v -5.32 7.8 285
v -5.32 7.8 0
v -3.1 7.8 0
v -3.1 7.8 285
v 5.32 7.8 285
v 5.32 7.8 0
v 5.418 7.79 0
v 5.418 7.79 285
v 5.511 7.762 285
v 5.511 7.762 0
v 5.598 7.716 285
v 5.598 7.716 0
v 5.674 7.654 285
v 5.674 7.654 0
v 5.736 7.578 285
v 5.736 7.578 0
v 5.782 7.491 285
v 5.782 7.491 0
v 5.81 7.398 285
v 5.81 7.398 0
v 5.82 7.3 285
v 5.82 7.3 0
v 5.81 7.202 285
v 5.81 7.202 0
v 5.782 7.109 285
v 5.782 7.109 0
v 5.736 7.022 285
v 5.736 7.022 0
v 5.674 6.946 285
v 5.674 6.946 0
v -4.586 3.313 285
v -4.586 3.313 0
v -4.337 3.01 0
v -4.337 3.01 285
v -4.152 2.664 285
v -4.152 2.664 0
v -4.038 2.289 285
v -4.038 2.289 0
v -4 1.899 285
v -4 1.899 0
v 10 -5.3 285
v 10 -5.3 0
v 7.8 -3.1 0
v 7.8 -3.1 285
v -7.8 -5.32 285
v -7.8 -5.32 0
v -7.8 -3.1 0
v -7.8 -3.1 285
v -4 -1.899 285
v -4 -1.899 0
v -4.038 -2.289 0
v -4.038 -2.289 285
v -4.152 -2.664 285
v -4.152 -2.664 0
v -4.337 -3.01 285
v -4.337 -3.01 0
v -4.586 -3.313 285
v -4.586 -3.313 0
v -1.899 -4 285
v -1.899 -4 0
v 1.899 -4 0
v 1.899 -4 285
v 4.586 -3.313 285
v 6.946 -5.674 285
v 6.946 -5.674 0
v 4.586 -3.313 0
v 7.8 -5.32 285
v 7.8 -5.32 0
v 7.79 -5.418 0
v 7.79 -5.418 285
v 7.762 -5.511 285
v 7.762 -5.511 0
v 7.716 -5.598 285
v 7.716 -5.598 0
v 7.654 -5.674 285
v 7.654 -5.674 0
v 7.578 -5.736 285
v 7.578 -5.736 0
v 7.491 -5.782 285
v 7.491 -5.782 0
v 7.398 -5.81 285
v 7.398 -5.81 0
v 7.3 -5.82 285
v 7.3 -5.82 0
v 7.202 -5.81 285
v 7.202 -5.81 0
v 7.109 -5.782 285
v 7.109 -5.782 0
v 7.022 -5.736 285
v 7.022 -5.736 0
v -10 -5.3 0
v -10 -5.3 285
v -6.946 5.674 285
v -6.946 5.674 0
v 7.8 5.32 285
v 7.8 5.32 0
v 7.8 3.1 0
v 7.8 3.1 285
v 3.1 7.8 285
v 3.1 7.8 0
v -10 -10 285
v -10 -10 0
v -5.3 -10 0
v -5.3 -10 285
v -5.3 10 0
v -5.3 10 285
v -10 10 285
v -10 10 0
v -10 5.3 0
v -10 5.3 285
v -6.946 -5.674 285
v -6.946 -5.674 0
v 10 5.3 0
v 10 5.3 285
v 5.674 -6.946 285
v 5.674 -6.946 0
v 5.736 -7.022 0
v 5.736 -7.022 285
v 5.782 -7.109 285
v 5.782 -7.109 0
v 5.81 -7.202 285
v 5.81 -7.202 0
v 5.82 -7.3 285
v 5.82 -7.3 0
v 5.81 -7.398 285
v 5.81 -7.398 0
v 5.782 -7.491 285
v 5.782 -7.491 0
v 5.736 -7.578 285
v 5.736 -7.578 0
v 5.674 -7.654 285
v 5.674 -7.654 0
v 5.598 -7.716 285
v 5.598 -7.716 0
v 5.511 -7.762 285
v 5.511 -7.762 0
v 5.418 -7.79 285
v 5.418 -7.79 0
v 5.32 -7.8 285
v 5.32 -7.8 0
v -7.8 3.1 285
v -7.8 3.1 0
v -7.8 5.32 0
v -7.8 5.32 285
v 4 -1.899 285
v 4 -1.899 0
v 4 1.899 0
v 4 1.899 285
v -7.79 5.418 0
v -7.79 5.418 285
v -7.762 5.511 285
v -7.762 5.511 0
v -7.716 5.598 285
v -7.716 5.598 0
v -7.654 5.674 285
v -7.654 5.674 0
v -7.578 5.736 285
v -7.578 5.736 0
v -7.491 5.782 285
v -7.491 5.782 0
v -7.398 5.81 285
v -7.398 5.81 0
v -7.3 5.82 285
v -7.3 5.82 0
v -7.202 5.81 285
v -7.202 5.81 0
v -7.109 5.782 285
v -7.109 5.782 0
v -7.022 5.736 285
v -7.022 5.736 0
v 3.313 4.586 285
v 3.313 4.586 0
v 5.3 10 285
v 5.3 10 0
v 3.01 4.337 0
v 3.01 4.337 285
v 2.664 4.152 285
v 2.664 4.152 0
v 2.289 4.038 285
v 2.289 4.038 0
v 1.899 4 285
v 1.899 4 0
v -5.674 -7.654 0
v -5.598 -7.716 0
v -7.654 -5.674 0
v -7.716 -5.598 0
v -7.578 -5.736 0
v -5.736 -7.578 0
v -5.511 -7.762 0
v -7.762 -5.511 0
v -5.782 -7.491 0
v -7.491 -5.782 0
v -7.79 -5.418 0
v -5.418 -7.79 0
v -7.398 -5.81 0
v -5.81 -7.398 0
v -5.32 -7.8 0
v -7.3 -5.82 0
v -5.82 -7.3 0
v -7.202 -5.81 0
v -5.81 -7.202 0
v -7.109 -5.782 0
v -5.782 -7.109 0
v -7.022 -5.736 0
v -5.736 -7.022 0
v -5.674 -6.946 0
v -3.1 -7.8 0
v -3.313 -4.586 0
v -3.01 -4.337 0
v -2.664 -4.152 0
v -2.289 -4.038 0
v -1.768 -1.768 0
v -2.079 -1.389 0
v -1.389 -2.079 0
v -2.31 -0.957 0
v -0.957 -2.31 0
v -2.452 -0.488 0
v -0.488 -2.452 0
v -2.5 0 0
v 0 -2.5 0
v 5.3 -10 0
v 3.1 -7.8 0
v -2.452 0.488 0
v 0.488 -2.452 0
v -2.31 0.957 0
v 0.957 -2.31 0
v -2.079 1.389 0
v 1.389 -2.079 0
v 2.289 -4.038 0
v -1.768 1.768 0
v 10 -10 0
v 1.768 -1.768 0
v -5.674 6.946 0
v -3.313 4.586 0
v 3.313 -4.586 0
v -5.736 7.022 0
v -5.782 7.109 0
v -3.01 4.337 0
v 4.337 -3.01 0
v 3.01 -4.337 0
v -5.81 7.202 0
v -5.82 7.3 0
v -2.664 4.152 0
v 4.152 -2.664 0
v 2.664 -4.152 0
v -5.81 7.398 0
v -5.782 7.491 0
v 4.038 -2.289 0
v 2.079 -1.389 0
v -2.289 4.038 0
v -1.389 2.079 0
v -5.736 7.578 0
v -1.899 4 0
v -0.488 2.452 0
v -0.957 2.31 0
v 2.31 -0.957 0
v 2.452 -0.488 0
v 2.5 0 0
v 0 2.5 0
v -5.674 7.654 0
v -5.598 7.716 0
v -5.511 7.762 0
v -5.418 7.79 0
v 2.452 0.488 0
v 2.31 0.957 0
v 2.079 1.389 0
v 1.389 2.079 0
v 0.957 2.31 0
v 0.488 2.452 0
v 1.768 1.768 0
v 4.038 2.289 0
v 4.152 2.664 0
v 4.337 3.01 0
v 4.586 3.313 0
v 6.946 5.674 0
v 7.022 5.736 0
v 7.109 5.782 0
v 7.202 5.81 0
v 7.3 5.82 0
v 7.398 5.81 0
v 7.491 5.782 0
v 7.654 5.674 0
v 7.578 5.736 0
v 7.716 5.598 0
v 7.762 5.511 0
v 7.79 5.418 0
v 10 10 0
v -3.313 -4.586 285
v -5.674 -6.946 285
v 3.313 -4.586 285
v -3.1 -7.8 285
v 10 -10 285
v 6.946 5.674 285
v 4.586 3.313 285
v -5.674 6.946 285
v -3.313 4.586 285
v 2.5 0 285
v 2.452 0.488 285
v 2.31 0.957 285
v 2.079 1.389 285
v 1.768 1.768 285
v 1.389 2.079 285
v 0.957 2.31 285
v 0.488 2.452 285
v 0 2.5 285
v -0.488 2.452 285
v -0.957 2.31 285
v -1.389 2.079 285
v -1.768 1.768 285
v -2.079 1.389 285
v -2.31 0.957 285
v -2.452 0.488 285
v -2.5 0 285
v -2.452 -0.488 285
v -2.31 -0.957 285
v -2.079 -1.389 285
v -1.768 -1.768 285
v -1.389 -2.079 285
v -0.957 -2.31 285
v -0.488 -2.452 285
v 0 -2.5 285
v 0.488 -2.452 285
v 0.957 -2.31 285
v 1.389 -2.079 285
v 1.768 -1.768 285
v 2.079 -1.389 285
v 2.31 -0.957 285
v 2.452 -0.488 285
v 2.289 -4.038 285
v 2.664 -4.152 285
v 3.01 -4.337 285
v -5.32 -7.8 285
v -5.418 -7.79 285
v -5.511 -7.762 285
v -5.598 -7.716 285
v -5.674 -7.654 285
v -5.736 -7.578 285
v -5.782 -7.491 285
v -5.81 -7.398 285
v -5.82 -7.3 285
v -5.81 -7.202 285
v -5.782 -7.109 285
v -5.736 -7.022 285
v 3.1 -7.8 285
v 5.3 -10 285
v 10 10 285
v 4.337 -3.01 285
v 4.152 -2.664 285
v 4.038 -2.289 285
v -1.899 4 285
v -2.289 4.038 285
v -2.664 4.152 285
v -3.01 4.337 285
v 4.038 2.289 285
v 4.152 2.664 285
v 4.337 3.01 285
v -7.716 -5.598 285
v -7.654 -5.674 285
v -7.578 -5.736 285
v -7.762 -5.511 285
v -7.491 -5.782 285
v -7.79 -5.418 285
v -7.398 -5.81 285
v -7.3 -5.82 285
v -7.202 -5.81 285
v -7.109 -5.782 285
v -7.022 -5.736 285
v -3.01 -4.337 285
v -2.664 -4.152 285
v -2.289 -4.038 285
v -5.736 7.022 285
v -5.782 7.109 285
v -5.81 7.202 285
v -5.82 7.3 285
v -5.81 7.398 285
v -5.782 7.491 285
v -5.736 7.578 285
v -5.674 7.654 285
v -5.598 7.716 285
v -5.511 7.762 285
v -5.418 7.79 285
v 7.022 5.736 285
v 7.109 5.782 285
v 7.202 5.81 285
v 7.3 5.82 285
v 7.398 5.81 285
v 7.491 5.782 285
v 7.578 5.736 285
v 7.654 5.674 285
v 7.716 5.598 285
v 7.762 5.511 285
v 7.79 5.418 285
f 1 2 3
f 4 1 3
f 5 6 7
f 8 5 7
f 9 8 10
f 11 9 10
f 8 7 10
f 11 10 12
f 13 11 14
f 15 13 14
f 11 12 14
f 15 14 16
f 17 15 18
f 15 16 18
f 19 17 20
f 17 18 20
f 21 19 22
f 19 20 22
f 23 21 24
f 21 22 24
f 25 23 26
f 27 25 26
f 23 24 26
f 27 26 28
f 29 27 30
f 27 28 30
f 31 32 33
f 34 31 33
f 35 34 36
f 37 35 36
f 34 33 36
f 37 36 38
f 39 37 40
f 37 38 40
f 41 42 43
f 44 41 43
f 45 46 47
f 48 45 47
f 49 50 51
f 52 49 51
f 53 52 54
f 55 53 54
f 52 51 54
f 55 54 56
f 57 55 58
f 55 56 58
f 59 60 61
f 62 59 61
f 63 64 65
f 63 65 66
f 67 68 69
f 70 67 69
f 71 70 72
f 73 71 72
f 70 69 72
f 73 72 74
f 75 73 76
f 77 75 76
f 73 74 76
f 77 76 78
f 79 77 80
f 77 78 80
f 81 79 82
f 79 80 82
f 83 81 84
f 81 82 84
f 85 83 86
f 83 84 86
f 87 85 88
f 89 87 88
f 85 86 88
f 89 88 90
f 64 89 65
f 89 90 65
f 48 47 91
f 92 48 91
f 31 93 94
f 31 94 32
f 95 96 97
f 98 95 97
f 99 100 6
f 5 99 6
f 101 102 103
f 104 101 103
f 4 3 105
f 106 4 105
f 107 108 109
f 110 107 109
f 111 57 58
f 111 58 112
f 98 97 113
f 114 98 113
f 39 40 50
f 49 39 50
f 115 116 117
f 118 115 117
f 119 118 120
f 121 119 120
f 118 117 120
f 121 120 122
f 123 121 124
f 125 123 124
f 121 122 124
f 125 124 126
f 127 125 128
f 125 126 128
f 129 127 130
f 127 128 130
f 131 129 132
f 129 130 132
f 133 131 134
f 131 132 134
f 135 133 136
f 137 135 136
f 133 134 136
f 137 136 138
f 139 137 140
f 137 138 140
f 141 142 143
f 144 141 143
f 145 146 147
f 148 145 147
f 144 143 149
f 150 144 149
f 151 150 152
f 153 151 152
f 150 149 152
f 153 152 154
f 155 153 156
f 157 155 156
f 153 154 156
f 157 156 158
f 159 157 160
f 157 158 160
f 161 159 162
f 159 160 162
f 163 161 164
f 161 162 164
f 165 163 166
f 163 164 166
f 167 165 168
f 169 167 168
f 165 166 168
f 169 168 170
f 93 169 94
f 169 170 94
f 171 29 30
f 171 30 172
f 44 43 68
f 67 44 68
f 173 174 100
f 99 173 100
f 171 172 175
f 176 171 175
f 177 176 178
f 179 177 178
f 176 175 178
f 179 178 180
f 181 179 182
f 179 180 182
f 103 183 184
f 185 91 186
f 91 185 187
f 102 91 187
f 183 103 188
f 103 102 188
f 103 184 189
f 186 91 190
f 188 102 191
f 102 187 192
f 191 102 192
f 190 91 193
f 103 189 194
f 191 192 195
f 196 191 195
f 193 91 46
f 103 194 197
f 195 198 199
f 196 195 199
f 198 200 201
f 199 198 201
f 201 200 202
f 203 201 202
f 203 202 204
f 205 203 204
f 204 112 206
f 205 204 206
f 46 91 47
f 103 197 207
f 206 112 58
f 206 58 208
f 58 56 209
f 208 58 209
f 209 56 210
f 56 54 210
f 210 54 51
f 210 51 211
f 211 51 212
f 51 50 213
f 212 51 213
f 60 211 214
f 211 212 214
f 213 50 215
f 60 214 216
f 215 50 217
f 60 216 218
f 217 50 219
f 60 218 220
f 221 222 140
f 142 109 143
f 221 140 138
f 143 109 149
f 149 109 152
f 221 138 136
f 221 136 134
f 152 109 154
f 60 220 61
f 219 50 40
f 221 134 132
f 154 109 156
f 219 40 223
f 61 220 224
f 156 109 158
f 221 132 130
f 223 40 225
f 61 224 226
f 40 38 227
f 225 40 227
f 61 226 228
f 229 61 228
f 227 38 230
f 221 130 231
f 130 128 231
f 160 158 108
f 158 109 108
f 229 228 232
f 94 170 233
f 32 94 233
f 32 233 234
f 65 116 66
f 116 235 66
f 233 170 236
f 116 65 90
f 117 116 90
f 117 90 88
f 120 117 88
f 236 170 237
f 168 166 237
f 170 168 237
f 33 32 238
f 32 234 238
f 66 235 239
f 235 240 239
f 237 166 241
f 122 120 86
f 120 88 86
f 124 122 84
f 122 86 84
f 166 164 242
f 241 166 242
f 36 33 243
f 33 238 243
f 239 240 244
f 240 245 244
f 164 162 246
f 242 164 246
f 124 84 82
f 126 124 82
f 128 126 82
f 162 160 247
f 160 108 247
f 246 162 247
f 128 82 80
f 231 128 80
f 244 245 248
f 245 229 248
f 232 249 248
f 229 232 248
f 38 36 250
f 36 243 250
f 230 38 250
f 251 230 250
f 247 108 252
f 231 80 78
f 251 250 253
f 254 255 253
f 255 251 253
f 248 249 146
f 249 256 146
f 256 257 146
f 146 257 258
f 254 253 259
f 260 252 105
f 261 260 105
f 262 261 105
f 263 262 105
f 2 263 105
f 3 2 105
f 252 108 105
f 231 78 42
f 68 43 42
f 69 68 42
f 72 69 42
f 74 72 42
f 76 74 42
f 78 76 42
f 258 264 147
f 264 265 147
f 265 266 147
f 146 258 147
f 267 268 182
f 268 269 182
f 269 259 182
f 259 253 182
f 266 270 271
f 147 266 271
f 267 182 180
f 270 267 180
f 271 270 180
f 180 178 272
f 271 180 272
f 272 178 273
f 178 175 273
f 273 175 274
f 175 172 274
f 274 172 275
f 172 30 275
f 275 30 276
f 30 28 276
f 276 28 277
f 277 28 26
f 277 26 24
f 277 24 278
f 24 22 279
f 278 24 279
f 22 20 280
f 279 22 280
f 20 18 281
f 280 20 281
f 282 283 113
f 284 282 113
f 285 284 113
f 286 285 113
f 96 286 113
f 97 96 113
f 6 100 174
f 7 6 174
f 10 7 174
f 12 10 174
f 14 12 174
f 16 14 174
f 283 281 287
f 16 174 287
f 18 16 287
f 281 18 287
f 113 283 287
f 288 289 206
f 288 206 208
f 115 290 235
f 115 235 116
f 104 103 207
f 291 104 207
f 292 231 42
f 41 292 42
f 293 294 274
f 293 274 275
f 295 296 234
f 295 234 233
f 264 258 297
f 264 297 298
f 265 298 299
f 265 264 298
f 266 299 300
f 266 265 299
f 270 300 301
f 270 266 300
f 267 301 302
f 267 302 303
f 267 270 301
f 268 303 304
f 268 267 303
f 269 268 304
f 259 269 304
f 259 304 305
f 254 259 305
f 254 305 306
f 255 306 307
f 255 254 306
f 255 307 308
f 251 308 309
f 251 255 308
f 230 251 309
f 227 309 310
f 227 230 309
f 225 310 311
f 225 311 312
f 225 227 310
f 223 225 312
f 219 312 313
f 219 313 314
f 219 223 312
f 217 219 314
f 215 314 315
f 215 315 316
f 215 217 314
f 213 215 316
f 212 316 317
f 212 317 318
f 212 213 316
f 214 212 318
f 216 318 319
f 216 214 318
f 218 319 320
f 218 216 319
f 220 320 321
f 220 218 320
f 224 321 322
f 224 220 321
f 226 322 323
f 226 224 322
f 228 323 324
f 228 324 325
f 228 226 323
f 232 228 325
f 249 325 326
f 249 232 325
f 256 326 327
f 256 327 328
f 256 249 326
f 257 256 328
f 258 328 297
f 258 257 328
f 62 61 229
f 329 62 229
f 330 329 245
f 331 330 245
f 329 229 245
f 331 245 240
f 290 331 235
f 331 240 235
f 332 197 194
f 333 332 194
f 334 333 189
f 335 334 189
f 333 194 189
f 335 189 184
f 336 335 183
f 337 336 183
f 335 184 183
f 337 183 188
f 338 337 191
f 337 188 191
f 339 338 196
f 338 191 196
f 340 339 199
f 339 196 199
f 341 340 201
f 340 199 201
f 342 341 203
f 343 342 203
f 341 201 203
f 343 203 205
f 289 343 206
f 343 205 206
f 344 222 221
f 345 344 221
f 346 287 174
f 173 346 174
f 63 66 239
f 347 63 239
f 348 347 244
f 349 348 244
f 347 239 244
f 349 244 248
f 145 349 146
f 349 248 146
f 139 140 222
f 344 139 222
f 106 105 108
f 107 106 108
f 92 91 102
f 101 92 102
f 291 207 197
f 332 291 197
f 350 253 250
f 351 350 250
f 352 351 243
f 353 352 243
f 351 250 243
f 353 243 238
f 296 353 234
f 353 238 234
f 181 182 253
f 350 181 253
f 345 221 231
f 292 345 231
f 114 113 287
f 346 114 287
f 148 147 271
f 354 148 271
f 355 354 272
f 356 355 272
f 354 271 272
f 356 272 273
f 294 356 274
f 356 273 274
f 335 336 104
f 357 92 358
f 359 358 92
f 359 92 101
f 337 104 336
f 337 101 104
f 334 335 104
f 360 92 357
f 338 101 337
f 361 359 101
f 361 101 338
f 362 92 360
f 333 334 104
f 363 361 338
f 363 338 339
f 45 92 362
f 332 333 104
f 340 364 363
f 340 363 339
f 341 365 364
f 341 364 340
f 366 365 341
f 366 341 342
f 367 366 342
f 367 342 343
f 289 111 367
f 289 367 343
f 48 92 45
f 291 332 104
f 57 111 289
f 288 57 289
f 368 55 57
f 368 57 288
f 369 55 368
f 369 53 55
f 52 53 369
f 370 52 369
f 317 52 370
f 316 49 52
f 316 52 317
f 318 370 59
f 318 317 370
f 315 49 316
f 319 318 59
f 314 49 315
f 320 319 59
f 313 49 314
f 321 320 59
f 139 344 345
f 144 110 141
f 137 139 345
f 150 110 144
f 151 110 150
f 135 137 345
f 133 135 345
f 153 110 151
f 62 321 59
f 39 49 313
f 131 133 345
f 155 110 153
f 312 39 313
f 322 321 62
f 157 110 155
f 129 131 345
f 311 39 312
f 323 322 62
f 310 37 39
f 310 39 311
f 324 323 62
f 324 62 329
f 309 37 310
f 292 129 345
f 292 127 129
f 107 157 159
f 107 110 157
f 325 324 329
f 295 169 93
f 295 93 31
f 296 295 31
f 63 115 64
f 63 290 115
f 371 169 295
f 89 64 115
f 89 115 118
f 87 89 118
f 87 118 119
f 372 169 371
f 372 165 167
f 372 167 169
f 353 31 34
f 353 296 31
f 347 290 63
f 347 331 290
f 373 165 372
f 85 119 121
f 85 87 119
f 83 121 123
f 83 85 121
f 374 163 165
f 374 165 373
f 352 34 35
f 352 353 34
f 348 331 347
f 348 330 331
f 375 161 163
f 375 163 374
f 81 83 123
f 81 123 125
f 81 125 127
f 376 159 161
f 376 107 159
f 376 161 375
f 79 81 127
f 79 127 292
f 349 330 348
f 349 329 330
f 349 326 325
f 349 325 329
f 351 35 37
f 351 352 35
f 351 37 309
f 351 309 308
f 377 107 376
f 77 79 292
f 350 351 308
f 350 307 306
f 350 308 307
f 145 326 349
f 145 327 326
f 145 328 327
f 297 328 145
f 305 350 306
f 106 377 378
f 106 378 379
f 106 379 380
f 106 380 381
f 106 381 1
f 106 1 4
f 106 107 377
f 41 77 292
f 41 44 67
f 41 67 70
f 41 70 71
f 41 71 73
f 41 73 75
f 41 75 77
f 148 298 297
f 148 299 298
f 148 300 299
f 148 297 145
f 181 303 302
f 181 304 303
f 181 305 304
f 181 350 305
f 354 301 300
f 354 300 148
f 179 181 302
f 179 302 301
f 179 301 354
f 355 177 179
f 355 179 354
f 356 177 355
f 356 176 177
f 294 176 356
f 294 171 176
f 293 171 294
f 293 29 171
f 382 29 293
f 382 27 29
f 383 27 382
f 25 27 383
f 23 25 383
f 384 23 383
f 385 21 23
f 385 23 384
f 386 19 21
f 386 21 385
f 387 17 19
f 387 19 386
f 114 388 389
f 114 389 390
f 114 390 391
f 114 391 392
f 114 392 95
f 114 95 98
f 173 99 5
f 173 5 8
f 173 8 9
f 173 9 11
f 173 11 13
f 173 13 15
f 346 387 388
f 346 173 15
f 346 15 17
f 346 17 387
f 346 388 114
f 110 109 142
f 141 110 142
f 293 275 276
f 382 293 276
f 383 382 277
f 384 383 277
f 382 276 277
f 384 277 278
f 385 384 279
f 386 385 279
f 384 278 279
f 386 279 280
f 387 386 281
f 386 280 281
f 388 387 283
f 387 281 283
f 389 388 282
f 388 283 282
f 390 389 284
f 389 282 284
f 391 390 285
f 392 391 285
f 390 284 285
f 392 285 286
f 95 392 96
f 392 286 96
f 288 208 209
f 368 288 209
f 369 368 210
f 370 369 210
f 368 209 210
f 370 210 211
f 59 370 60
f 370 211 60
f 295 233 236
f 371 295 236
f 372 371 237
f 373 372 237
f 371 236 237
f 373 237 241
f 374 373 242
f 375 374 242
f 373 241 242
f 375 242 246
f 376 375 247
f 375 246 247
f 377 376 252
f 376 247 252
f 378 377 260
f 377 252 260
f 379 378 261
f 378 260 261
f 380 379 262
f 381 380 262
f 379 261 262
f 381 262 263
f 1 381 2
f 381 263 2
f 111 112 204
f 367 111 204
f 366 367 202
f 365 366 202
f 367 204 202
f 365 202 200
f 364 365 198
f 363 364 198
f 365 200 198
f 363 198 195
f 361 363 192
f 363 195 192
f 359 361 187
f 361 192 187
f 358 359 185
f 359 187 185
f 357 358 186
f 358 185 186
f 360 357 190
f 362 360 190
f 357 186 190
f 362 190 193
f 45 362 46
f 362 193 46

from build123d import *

# Parameters (mm, degrees)
SKETCH1_R           = 2.5
BOSS_EXTRUDE1_DEPTH = 285


with BuildPart() as part:
    # Sketch1 → Boss-Extrude1 (new body)
    with BuildSketch(Plane.XY):
        with BuildLine():
            Line((-10, 10), (-10, 5.3))
            Line((-10, 5.3), (-7.8, 3.1))
            Line((-7.8, 3.1), (-7.8, 5.320101013))
            ThreePointArc((-7.8, 5.320101013), (-7.491341716, 5.782040779), (-6.946446609, 5.673654403))
            Line((-6.946446609, 5.673654403), (-4.585786438, 3.312994231))
            ThreePointArc((-4.585786438, 3.312994231), (-4.152240935, 2.664147534), (-4, 1.898780669))
            Line((-4, 1.898780669), (-4, 0))
            Line((-4, 0), (-4, -1.898780669))
            ThreePointArc((-4, -1.898780669), (-4.152240935, -2.664147534), (-4.585786438, -3.312994231))
            Line((-4.585786438, -3.312994231), (-6.946446609, -5.673654403))
            ThreePointArc((-6.946446609, -5.673654403), (-7.491341716, -5.782040779), (-7.8, -5.320101013))
            Line((-7.8, -5.320101013), (-7.8, -3.1))
            Line((-7.8, -3.1), (-10, -5.3))
            Line((-10, -5.3), (-10, -10))
            Line((-10, -10), (-5.3, -10))
            Line((-5.3, -10), (-3.1, -7.8))
            Line((-3.1, -7.8), (-5.320101013, -7.8))
            ThreePointArc((-5.320101013, -7.8), (-5.782040779, -7.491341716), (-5.673654403, -6.946446609))
            Line((-5.673654403, -6.946446609), (-3.312994231, -4.585786438))
            ThreePointArc((-3.312994231, -4.585786438), (-2.664147534, -4.152240935), (-1.898780669, -4))
            Line((-1.898780669, -4), (0, -4))
            Line((0, -4), (1.898780669, -4))
            ThreePointArc((1.898780669, -4), (2.664147534, -4.152240935), (3.312994231, -4.585786438))
            Line((3.312994231, -4.585786438), (5.673654403, -6.946446609))
            ThreePointArc((5.673654403, -6.946446609), (5.782040779, -7.491341716), (5.320101013, -7.8))
            Line((5.320101013, -7.8), (3.1, -7.8))
            Line((3.1, -7.8), (5.3, -10))
            Line((5.3, -10), (10, -10))
            Line((10, -10), (10, -5.3))
            Line((10, -5.3), (7.8, -3.1))
            Line((7.8, -3.1), (7.8, -5.320101013))
            ThreePointArc((7.8, -5.320101013), (7.491341716, -5.782040779), (6.946446609, -5.673654403))
            Line((6.946446609, -5.673654403), (4.585786438, -3.312994231))
            ThreePointArc((4.585786438, -3.312994231), (4.152240935, -2.664147534), (4, -1.898780669))
            Line((4, -1.898780669), (4, 0))
            Line((4, 0), (4, 1.898780669))
            ThreePointArc((4, 1.898780669), (4.152240935, 2.664147534), (4.585786438, 3.312994231))
            Line((4.585786438, 3.312994231), (6.946446609, 5.673654403))
            ThreePointArc((6.946446609, 5.673654403), (7.491341716, 5.782040779), (7.8, 5.320101013))
            Line((7.8, 5.320101013), (7.8, 3.1))
            Line((7.8, 3.1), (10, 5.3))
            Line((10, 5.3), (10, 10))
            Line((10, 10), (5.3, 10))
            Line((5.3, 10), (3.1, 7.8))
            Line((3.1, 7.8), (5.320101013, 7.8))
            ThreePointArc((5.320101013, 7.8), (5.782040779, 7.491341716), (5.673654403, 6.946446609))
            Line((5.673654403, 6.946446609), (3.312994231, 4.585786438))
            ThreePointArc((3.312994231, 4.585786438), (2.664147534, 4.152240935), (1.898780669, 4))
            Line((1.898780669, 4), (0, 4))
            Line((0, 4), (-1.898780669, 4))
            ThreePointArc((-1.898780669, 4), (-2.664147534, 4.152240935), (-3.312994231, 4.585786438))
            Line((-3.312994231, 4.585786438), (-5.673654403, 6.946446609))
            ThreePointArc((-5.673654403, 6.946446609), (-5.782040779, 7.491341716), (-5.320101013, 7.8))
            Line((-5.320101013, 7.8), (-3.1, 7.8))
            Line((-3.1, 7.8), (-5.3, 10))
            Line((-5.3, 10), (-10, 10))
        make_face()
        Circle(SKETCH1_R, mode=Mode.SUBTRACT)
    extrude(amount=BOSS_EXTRUDE1_DEPTH)


solid = part.part
